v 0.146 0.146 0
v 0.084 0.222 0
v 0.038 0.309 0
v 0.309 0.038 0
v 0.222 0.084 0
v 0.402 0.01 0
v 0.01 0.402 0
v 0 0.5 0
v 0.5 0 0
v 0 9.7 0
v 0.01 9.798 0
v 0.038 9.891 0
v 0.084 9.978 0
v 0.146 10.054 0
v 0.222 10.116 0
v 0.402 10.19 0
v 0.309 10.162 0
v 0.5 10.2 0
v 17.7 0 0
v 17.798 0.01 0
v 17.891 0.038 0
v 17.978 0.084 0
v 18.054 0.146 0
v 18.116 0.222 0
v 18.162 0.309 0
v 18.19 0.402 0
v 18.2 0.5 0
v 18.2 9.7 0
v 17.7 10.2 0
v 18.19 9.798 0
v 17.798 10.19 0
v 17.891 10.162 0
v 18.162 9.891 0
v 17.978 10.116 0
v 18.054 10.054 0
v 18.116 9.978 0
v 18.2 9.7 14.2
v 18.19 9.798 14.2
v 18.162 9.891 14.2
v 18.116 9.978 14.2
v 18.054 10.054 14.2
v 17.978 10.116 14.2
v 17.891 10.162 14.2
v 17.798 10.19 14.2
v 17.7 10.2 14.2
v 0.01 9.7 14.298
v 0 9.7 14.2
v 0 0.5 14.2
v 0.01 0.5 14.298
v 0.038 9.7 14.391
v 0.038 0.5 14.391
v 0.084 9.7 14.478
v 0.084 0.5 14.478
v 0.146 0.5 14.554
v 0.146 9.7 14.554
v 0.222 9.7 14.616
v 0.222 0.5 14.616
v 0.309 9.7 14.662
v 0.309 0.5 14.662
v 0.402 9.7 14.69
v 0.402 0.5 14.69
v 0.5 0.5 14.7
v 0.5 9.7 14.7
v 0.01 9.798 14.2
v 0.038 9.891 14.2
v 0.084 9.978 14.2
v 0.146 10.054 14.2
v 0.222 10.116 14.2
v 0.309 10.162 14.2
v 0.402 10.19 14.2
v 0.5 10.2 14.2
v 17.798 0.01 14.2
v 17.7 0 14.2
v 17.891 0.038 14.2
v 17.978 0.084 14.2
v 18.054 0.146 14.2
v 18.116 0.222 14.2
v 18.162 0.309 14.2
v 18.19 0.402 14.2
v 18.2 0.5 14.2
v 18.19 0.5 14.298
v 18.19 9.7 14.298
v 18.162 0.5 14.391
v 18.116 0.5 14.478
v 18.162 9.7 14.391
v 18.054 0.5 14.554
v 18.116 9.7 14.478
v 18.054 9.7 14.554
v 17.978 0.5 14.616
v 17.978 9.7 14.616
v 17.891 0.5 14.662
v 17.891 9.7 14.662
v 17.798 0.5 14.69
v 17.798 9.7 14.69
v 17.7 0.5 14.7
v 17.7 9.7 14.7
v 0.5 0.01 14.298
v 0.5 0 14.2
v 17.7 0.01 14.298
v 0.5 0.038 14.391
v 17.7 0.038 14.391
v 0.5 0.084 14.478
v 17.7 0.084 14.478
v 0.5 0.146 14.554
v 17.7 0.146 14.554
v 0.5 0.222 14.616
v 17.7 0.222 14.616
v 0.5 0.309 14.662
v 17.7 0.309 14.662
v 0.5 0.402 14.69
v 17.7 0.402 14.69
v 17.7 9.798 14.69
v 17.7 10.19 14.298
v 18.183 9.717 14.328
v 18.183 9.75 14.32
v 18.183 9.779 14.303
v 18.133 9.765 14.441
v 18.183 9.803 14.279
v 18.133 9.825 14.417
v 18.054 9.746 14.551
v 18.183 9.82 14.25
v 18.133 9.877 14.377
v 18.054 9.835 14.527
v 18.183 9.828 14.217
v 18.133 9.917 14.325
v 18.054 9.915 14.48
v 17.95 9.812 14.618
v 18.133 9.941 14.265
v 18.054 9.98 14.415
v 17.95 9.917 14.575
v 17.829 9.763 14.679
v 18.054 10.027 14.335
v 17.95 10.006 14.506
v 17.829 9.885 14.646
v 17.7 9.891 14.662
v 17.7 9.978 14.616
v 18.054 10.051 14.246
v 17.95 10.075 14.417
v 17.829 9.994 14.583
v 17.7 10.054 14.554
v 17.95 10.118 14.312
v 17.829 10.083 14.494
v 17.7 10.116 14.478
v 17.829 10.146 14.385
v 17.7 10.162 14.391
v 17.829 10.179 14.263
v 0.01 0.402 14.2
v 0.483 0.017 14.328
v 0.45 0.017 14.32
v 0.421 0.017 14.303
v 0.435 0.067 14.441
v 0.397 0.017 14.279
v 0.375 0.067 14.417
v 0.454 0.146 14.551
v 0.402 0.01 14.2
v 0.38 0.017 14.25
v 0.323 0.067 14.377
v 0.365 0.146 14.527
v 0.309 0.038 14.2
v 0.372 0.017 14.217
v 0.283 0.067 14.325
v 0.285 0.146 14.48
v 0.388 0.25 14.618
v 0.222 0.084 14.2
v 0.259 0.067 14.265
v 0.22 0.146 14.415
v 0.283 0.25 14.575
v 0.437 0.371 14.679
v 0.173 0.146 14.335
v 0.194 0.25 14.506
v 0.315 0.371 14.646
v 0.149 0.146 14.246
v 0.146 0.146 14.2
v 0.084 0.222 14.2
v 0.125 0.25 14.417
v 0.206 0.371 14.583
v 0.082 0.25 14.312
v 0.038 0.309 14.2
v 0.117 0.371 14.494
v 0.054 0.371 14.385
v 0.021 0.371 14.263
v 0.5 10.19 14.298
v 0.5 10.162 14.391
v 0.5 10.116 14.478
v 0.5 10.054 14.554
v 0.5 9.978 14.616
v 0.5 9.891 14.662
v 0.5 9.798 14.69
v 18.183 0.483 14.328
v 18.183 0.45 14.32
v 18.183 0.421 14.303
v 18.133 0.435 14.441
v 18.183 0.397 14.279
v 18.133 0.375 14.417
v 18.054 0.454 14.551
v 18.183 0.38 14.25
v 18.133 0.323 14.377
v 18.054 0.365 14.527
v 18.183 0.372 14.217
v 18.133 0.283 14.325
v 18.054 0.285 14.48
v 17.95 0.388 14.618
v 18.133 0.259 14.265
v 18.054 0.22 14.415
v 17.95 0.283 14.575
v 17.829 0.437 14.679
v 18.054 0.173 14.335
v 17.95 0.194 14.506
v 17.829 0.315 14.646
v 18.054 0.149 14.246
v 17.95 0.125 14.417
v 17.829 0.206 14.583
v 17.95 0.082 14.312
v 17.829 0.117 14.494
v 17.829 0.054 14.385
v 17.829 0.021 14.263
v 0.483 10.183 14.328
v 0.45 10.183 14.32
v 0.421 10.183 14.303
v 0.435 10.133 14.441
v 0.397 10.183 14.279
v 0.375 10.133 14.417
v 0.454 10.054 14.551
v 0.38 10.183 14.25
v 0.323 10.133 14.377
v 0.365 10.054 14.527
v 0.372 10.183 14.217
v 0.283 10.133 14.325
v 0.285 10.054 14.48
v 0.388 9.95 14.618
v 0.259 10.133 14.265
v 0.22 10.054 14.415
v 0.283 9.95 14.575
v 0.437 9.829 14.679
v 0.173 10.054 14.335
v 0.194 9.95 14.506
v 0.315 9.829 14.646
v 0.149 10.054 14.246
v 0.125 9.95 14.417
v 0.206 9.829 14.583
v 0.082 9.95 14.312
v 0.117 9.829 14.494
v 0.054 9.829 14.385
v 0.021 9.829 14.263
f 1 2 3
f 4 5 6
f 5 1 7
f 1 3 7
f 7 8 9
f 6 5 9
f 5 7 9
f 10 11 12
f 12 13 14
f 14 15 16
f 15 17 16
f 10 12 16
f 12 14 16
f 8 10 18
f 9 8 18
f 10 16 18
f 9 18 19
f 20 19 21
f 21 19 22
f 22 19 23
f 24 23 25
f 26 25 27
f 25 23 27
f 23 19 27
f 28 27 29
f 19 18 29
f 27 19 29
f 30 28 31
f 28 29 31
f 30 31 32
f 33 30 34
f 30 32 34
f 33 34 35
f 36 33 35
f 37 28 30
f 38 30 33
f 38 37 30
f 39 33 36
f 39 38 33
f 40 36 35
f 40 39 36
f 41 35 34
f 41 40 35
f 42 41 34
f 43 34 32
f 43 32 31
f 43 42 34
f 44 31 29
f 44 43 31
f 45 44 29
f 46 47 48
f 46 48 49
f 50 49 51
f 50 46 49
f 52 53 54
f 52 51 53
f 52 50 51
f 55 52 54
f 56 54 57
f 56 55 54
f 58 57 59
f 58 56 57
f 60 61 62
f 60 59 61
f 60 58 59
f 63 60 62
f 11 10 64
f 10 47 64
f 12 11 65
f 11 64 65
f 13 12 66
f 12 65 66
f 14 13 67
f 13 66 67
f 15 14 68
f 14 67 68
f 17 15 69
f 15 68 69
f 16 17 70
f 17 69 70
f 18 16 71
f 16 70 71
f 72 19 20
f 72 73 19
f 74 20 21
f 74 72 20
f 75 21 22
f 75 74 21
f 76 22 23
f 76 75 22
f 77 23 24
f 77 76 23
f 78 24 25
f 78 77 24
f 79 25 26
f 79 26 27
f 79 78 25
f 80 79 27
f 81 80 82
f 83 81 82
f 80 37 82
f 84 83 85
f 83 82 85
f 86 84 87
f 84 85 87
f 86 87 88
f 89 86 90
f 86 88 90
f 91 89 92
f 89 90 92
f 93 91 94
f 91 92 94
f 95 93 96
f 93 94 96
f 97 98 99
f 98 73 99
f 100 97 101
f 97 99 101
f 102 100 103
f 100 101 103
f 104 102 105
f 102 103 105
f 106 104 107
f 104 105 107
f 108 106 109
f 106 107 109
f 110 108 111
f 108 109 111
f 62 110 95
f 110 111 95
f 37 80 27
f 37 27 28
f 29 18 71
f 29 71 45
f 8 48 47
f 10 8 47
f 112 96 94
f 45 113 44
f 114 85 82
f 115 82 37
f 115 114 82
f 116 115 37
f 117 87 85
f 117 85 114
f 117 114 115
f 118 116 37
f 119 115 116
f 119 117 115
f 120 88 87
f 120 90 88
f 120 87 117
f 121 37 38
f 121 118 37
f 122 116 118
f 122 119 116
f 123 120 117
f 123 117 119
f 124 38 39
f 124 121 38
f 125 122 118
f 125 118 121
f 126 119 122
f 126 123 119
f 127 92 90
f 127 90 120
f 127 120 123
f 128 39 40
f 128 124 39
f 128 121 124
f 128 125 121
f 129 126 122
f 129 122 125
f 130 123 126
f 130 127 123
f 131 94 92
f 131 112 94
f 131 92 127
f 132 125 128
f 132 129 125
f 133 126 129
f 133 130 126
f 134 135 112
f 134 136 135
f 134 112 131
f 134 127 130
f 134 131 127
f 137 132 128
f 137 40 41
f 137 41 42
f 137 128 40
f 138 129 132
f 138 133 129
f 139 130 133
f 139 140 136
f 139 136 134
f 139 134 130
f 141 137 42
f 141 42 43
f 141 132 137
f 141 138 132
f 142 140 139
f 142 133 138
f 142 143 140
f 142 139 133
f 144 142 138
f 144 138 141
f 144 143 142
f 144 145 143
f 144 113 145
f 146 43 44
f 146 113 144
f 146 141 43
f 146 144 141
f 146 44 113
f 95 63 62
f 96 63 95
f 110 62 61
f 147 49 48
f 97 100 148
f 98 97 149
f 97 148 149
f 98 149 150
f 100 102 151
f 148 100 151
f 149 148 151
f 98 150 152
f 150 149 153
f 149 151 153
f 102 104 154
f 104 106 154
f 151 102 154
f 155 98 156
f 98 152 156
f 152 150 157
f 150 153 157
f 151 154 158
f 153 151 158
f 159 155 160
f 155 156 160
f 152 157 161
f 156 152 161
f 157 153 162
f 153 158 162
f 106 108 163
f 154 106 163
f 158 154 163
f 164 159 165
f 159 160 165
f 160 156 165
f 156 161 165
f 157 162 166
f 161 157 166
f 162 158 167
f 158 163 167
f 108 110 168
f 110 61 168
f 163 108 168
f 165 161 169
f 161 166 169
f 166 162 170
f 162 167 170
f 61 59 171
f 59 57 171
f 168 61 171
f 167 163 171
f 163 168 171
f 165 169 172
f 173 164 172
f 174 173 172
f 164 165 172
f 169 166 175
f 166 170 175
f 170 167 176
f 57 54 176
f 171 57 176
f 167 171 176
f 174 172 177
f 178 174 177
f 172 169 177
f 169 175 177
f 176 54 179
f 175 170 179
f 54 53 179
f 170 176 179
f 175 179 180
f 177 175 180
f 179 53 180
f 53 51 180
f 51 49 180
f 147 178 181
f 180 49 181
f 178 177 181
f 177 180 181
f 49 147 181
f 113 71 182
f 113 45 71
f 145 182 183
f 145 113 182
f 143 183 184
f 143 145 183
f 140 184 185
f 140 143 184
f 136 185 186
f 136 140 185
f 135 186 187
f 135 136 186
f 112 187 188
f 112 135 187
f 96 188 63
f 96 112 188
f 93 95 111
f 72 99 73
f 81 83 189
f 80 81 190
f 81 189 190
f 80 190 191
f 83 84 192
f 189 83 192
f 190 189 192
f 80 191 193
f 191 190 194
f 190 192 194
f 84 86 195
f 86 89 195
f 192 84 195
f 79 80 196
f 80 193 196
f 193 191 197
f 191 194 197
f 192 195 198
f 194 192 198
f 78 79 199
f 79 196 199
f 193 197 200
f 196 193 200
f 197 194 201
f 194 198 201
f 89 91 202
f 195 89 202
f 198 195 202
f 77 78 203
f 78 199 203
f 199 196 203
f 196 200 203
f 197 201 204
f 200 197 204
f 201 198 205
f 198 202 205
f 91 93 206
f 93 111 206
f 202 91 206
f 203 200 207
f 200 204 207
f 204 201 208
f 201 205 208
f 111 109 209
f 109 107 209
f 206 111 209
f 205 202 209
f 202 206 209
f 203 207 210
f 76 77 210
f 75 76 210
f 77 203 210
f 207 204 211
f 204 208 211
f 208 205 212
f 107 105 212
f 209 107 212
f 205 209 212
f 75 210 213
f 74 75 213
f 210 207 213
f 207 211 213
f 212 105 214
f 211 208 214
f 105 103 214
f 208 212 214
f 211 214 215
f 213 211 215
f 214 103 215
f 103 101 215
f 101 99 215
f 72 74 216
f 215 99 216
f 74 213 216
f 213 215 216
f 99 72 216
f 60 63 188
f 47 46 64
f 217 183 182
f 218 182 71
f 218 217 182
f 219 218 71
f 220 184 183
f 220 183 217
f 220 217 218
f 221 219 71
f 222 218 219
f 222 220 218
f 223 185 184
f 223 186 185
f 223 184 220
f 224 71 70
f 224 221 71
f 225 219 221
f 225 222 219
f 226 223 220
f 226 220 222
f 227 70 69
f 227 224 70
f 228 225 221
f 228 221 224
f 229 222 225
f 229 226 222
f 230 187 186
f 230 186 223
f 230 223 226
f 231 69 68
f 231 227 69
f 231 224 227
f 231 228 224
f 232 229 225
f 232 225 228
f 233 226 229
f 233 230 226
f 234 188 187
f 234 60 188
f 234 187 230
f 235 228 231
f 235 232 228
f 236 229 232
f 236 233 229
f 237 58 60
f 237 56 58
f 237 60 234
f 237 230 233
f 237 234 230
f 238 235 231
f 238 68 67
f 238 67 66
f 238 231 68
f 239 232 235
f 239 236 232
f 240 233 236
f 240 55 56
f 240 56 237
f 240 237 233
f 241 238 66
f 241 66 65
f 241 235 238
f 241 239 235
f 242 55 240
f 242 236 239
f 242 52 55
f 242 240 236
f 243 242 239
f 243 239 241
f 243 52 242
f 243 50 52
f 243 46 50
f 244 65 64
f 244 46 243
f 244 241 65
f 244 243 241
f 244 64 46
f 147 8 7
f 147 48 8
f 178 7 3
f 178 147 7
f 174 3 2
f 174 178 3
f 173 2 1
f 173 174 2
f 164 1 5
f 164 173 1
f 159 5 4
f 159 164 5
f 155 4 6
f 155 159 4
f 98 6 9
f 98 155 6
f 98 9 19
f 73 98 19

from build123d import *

# Parameters (mm, degrees)
SKETCH_W  = 18.2
SKETCH_H  = 10.2
PAD_DEPTH = 14.7
FILLET_R  = 0.5


with BuildPart() as part:
    # Sketch → Pad (new body)
    with BuildSketch(Plane.XY):
        with Locations((9.1, 5.1)):
            Rectangle(SKETCH_W, SKETCH_H)
    extrude(amount=PAD_DEPTH)

    # Fillet
    fillet_edges = [part.edges().sort_by_distance(p)[0] for p in [
        (0, 5.1, 14.7),
        (9.1, 0, 14.7),
        (9.1, 10.2, 14.7),
        (18.2, 5.1, 14.7),
        (18.2, 0, 7.35),
        (18.2, 10.2, 7.35),
        (0, 10.2, 7.35),
        (0, 0, 7.35),
    ]]
    fillet(fillet_edges, radius=FILLET_R)


solid = part.part
